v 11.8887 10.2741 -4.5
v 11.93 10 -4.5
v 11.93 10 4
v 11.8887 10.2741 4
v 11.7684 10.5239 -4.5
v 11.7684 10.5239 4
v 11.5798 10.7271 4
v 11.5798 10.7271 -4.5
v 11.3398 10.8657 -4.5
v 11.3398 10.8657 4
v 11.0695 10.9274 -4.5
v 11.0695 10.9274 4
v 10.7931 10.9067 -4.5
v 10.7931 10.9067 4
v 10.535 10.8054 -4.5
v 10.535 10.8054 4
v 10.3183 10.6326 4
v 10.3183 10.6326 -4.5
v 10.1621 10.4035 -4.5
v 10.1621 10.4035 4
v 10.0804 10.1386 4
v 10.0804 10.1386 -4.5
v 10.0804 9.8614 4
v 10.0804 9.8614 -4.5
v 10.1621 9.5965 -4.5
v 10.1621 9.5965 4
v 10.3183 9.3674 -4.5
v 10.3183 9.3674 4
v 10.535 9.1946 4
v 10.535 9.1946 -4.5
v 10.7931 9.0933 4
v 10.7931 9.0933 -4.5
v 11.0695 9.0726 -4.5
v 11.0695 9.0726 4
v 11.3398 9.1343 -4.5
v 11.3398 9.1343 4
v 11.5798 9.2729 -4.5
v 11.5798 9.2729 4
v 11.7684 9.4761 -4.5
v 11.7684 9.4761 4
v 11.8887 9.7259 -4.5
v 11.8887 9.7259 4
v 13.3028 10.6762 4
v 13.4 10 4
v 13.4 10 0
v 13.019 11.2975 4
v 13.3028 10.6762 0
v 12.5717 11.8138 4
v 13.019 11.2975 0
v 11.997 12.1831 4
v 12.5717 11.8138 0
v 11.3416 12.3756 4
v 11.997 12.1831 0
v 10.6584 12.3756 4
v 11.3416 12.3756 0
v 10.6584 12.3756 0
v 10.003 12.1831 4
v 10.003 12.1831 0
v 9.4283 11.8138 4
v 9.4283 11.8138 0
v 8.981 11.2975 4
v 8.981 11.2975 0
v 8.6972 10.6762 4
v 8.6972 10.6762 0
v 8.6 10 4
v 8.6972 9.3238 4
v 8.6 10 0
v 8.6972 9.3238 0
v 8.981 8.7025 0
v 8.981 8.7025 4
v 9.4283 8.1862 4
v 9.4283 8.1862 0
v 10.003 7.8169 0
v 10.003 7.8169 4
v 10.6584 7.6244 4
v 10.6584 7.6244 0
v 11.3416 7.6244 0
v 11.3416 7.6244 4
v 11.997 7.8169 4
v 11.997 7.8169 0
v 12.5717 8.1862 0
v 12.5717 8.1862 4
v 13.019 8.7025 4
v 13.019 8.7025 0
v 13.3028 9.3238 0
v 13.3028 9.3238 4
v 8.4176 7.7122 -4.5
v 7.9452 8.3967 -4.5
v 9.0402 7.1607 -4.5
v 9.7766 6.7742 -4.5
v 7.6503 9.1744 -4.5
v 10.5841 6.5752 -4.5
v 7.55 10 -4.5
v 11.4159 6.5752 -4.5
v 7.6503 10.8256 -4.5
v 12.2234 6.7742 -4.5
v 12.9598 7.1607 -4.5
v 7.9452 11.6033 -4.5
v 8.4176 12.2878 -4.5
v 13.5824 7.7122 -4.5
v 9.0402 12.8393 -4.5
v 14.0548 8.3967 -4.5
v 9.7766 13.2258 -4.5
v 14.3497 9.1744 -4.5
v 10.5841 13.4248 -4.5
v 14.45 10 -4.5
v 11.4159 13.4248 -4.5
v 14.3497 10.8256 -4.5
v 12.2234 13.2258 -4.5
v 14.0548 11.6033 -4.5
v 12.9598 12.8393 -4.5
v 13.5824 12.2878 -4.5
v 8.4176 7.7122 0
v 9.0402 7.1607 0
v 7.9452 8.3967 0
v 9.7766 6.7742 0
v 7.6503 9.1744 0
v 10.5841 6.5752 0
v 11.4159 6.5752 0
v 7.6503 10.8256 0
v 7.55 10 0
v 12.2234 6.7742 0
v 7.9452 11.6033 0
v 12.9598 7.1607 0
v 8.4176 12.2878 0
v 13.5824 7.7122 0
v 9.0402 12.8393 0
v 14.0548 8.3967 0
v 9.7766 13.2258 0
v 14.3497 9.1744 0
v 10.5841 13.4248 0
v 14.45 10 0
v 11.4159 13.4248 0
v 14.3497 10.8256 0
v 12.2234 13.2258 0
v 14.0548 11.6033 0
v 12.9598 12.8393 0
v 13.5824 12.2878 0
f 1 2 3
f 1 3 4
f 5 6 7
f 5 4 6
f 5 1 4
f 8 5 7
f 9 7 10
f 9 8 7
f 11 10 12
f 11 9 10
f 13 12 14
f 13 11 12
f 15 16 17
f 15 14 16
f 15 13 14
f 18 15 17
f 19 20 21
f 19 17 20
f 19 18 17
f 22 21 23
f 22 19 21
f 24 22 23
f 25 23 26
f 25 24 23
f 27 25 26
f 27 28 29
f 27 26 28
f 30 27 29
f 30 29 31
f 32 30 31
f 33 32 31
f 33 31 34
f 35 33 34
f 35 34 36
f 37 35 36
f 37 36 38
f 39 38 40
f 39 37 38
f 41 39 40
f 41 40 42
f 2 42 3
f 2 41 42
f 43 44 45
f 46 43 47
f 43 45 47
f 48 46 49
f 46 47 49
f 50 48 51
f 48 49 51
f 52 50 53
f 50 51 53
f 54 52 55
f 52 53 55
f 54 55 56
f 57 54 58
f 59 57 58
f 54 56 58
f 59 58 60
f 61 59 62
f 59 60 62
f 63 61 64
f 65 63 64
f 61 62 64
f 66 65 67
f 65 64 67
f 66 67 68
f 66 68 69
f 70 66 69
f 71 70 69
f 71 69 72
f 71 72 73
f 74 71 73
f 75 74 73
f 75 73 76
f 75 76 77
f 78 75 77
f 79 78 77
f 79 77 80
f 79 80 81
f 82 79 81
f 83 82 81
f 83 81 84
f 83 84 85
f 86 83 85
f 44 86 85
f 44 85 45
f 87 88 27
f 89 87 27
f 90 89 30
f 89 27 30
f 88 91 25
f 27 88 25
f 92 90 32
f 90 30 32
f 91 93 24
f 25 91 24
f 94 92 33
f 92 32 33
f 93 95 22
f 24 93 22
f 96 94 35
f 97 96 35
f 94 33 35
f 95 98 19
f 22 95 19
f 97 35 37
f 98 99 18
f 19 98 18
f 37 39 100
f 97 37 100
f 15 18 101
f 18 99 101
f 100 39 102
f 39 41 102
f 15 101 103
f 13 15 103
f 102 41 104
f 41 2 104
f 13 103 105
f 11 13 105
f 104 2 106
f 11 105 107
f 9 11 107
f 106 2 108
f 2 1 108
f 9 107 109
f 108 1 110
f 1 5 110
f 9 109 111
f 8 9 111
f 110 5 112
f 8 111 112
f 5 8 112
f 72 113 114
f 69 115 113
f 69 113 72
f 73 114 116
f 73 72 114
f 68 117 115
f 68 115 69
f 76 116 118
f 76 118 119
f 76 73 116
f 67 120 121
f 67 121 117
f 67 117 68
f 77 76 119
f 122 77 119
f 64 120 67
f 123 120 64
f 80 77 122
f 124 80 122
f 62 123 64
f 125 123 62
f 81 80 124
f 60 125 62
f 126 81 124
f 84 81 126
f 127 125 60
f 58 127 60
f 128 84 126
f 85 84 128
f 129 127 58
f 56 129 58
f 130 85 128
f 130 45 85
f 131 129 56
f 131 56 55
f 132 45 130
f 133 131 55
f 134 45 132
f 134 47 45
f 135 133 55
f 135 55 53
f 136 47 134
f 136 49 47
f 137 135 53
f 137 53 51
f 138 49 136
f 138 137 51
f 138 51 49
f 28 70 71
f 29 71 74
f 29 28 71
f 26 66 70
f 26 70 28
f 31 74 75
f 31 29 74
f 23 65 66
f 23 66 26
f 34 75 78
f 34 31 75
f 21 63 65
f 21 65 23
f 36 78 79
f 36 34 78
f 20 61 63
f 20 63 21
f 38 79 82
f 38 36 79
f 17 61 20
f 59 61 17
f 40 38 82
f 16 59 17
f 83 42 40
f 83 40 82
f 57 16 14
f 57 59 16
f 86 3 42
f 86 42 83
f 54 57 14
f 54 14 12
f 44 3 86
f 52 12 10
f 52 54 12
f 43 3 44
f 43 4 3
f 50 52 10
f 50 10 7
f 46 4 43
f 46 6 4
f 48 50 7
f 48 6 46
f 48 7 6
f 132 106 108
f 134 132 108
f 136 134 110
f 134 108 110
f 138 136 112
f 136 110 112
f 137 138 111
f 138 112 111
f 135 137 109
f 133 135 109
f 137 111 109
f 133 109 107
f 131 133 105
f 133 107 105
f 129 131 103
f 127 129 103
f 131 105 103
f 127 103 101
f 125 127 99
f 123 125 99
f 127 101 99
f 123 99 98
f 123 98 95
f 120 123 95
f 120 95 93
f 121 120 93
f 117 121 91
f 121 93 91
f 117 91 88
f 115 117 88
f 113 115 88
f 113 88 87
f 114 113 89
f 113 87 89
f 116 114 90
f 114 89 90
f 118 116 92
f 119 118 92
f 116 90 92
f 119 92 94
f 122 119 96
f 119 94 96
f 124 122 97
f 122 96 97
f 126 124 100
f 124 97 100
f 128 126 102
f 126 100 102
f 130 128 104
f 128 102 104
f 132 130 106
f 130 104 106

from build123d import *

# Parameters (mm, degrees)
CYLINDER003012_R     = 0.93
CYLINDER003012_DEPTH = 20
CYLINDER003013_R     = 2.4
CYLINDER003013_DEPTH = 4.5
CYLINDER003014_R     = 3.45
CYLINDER003014_DEPTH = 4.5


with BuildPart() as cylinder013:
    # Cylinder003012 → Cylinder003012 (new body)
    with BuildSketch(Plane(origin=(11, 10, -8), x_dir=(1, 0, 0), z_dir=(0, 0, 1))):
        Circle(CYLINDER003012_R)
    extrude(amount=CYLINDER003012_DEPTH)


with BuildPart() as cylinder014:
    # Cylinder003013 → Cylinder003013 (new body)
    with BuildSketch(Plane(origin=(11, 10, -0.5), x_dir=(1, 0, 0), z_dir=(0, 0, 1))):
        Circle(CYLINDER003013_R)
    extrude(amount=CYLINDER003013_DEPTH)


with BuildPart() as propeller_hub:
    # Cylinder003014 → Cylinder003014 (new body)
    with BuildSketch(Plane(origin=(11, 10, -4.5), x_dir=(1, 0, 0), z_dir=(0, 0, 1))):
        Circle(CYLINDER003014_R)
    extrude(amount=CYLINDER003014_DEPTH)

    # Fusion001: union Cylinder014
    add(cylinder014.part)

    # Cut002002002018: cut Cylinder013
    add(cylinder013.part, mode=Mode.SUBTRACT)


solid = propeller_hub.part
